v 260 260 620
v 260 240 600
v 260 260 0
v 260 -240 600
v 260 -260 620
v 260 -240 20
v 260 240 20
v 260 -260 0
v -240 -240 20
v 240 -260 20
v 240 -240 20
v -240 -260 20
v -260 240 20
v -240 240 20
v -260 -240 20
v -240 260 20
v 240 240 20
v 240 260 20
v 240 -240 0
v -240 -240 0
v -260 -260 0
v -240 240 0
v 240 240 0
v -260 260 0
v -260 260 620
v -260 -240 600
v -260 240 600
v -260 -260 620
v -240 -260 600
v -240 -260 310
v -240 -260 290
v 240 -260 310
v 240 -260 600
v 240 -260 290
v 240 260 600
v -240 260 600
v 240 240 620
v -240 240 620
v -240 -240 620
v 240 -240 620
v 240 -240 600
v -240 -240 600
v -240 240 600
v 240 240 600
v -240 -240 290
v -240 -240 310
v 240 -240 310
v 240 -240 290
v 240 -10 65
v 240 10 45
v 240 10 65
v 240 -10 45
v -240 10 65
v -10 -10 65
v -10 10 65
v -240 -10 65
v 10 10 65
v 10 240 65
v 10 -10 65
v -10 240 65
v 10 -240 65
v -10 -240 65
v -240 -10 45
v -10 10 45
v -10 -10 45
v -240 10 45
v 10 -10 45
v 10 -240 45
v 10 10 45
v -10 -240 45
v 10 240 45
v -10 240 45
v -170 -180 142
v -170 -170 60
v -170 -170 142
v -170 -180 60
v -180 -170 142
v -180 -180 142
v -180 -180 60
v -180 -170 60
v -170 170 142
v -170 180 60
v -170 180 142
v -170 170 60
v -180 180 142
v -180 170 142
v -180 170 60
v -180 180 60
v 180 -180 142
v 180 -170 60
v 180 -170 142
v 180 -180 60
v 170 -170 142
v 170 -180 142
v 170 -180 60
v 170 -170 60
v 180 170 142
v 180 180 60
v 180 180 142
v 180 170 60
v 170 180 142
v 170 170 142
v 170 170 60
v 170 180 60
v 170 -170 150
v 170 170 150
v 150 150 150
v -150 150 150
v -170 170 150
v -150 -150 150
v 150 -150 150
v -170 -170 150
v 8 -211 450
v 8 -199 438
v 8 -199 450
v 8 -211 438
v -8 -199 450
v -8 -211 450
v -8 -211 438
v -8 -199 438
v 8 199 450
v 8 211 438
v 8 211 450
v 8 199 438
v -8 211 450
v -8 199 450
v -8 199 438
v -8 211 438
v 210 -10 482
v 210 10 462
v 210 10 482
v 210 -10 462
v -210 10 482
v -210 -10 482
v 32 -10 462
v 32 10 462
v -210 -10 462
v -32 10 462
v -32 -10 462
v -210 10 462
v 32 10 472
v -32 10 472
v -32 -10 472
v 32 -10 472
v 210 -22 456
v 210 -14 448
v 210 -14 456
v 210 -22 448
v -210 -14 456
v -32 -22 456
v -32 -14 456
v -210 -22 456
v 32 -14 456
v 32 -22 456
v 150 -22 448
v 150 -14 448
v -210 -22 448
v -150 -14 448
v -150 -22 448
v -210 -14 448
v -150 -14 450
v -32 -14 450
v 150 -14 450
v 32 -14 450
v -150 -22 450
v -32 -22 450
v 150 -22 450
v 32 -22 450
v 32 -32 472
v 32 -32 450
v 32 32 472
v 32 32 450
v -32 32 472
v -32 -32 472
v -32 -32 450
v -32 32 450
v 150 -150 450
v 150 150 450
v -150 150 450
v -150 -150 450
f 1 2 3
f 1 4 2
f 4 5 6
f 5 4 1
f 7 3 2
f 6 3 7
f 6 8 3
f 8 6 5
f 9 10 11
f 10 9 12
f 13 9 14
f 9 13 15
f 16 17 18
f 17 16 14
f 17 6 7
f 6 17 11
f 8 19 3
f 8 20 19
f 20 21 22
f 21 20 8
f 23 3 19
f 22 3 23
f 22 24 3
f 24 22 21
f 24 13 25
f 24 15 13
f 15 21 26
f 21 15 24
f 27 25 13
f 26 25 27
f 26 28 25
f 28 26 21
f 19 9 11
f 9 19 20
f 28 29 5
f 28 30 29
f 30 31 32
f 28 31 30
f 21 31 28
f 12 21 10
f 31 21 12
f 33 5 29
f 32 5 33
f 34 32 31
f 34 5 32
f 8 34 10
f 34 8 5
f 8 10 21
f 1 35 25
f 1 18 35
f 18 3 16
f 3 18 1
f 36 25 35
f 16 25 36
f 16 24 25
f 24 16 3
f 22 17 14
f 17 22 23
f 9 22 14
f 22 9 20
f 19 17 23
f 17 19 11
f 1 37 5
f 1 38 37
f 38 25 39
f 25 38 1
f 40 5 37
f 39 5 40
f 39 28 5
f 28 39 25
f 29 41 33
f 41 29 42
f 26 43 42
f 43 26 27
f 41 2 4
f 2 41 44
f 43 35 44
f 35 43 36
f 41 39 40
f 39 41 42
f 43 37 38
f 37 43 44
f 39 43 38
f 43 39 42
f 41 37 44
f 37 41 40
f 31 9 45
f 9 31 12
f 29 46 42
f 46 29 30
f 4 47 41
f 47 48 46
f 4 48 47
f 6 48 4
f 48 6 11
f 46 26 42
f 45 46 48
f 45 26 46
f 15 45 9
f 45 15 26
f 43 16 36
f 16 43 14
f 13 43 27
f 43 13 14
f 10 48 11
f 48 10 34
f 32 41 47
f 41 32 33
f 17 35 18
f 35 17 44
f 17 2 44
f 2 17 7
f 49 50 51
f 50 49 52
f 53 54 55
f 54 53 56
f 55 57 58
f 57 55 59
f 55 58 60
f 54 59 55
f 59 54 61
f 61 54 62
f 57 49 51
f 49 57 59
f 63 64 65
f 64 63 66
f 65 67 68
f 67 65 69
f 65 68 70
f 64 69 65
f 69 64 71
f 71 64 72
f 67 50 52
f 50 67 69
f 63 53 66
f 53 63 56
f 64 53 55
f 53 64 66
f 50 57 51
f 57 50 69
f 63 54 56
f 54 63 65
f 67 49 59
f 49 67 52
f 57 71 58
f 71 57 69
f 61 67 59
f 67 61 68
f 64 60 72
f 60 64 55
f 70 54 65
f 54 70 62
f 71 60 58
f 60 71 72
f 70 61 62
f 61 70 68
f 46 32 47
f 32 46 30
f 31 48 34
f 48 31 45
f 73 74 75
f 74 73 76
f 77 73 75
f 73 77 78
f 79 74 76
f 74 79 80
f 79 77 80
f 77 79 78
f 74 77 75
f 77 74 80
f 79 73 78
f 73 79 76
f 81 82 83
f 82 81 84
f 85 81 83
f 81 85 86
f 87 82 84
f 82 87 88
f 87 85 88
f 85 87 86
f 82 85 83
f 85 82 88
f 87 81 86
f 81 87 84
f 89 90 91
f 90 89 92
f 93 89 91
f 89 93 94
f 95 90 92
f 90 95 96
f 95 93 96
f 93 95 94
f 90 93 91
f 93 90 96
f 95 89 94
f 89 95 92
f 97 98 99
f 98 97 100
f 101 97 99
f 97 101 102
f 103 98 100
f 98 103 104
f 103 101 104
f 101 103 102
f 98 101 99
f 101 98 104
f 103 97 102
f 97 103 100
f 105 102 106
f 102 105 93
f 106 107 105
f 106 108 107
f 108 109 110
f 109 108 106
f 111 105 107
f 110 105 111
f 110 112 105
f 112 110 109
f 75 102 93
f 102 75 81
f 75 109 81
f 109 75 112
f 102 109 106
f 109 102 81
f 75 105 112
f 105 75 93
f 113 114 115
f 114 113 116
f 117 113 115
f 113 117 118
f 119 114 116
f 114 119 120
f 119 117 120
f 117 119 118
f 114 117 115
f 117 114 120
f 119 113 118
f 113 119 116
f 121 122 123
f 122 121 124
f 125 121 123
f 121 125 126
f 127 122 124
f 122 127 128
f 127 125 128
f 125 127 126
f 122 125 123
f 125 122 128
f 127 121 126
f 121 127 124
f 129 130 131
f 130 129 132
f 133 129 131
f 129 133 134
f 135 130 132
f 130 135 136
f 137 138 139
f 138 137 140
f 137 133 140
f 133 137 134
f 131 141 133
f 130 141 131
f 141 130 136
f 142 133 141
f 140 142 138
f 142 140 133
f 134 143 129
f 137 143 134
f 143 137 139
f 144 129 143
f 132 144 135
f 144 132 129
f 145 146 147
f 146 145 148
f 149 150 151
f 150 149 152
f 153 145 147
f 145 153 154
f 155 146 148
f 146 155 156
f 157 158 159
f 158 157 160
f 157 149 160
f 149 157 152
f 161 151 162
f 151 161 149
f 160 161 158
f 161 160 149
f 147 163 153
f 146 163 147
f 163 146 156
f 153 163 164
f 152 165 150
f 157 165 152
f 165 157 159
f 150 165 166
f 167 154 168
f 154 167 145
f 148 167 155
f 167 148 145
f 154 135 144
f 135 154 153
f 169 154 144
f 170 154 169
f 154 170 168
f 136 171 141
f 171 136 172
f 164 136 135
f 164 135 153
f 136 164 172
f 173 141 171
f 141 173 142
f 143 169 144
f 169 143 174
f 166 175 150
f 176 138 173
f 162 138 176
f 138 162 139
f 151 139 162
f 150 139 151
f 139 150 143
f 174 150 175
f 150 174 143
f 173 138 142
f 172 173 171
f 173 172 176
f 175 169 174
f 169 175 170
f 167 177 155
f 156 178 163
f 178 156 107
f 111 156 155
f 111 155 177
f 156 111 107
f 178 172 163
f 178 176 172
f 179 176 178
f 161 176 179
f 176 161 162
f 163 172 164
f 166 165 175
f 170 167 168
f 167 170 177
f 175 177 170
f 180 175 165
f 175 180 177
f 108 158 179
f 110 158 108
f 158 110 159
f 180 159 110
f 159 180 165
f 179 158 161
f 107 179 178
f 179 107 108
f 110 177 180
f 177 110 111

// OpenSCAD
// Luminous Productive Machine Platform — LMF-FDM-300 envelope concept v0.1
// Status: CONCEPT GEOMETRY ONLY. Not a fabrication drawing or validated design.
// The model communicates a 300 mm-class CoreXY printer envelope and modular frame.
// Frame sizes, sections, joints, rails, belts, bed supports, thermal design,
// guarding, electrical protection and stiffness all require engineering review.
// Hardware licence is not yet assigned; do not redistribute derivatives as licensed.

$fn = 32;

// Editable design assumptions (millimetres)
build_x = 300;
build_y = 300;
build_z = 300;
frame_x = 520;
frame_y = 520;
frame_z = 620;
extrusion = 20;
rail_section = 20;
bed_x = 340;
bed_y = 340;
bed_t = 8;
bed_z = 142;
show_build_envelope = true;
show_gantry_concept = true;

module bar_x(length, section, z, y=0, x=0) {
    translate([x-length/2, y-section/2, z-section/2])
        cube([length, section, section]);
}

module bar_y(length, section, z, x=0, y=0) {
    translate([x-section/2, y-length/2, z-section/2])
        cube([section, length, section]);
}

module upright(section, height, x, y, z0=0) {
    translate([x-section/2, y-section/2, z0])
        cube([section, section, height]);
}

module frame_rails() {
    // Lower and upper rectangular rings.
    for (z = [extrusion/2, frame_z-extrusion/2]) {
        for (y = [-frame_y/2+extrusion/2, frame_y/2-extrusion/2])
            bar_x(frame_x, extrusion, z, y, 0);
        for (x = [-frame_x/2+extrusion/2, frame_x/2-extrusion/2])
            bar_y(frame_y, extrusion, z, x, 0);
    }
    // Four vertical corner uprights.
    for (x = [-frame_x/2+extrusion/2, frame_x/2-extrusion/2])
        for (y = [-frame_y/2+extrusion/2, frame_y/2-extrusion/2])
            upright(extrusion, frame_z-extrusion, x, y, extrusion);
    // Lower cross-members represent a base support concept.
    bar_x(frame_x-2*extrusion, extrusion, 55, 0, 0);
    bar_y(frame_y-2*extrusion, extrusion, 55, 0, 0);
    // Rear mid-height tie member; exact bracing is an engineering task.
    bar_x(frame_x-2*extrusion, extrusion, 300, -frame_y/2+extrusion/2, 0);
}

module bed_concept() {
    color("silver")
        translate([-bed_x/2, -bed_y/2, bed_z])
            cube([bed_x, bed_y, bed_t]);
    // Placeholder Z support columns; not a selected kinematic design.
    color("dimgray")
        for (x = [-175, 175])
            for (y = [-175, 175])
                translate([x-5, y-5, 60]) cube([10, 10, bed_z-60]);
}

module gantry_concept() {
    // Simplified beam, rail and toolhead envelope only; no belt path is defined.
    color("slategray")
        translate([-210, -10, bed_z+build_z+20])
            cube([420, 20, 20]);
    color("darkslategray")
        translate([-210, -22, bed_z+build_z+6])
            cube([420, 8, 8]);
    color("orangered")
        translate([-32, -32, bed_z+build_z-25])
            cube([64, 64, 55]);
    // Side rail placeholders.
    color("dimgray")
        for (y = [-205, 205])
            translate([-8, y-6, bed_z+build_z-4])
                cube([16, 12, 12]);
}

module build_envelope() {
    // Transparent conceptual volume above the build plate.
    color([0.15, 0.45, 0.9, 0.18])
        translate([-build_x/2, -build_y/2, bed_z+bed_t])
            cube([build_x, build_y, build_z]);
}

// Main scene
color("dimgray") frame_rails();
bed_concept();
if (show_gantry_concept) gantry_concept();
if (show_build_envelope) build_envelope();
